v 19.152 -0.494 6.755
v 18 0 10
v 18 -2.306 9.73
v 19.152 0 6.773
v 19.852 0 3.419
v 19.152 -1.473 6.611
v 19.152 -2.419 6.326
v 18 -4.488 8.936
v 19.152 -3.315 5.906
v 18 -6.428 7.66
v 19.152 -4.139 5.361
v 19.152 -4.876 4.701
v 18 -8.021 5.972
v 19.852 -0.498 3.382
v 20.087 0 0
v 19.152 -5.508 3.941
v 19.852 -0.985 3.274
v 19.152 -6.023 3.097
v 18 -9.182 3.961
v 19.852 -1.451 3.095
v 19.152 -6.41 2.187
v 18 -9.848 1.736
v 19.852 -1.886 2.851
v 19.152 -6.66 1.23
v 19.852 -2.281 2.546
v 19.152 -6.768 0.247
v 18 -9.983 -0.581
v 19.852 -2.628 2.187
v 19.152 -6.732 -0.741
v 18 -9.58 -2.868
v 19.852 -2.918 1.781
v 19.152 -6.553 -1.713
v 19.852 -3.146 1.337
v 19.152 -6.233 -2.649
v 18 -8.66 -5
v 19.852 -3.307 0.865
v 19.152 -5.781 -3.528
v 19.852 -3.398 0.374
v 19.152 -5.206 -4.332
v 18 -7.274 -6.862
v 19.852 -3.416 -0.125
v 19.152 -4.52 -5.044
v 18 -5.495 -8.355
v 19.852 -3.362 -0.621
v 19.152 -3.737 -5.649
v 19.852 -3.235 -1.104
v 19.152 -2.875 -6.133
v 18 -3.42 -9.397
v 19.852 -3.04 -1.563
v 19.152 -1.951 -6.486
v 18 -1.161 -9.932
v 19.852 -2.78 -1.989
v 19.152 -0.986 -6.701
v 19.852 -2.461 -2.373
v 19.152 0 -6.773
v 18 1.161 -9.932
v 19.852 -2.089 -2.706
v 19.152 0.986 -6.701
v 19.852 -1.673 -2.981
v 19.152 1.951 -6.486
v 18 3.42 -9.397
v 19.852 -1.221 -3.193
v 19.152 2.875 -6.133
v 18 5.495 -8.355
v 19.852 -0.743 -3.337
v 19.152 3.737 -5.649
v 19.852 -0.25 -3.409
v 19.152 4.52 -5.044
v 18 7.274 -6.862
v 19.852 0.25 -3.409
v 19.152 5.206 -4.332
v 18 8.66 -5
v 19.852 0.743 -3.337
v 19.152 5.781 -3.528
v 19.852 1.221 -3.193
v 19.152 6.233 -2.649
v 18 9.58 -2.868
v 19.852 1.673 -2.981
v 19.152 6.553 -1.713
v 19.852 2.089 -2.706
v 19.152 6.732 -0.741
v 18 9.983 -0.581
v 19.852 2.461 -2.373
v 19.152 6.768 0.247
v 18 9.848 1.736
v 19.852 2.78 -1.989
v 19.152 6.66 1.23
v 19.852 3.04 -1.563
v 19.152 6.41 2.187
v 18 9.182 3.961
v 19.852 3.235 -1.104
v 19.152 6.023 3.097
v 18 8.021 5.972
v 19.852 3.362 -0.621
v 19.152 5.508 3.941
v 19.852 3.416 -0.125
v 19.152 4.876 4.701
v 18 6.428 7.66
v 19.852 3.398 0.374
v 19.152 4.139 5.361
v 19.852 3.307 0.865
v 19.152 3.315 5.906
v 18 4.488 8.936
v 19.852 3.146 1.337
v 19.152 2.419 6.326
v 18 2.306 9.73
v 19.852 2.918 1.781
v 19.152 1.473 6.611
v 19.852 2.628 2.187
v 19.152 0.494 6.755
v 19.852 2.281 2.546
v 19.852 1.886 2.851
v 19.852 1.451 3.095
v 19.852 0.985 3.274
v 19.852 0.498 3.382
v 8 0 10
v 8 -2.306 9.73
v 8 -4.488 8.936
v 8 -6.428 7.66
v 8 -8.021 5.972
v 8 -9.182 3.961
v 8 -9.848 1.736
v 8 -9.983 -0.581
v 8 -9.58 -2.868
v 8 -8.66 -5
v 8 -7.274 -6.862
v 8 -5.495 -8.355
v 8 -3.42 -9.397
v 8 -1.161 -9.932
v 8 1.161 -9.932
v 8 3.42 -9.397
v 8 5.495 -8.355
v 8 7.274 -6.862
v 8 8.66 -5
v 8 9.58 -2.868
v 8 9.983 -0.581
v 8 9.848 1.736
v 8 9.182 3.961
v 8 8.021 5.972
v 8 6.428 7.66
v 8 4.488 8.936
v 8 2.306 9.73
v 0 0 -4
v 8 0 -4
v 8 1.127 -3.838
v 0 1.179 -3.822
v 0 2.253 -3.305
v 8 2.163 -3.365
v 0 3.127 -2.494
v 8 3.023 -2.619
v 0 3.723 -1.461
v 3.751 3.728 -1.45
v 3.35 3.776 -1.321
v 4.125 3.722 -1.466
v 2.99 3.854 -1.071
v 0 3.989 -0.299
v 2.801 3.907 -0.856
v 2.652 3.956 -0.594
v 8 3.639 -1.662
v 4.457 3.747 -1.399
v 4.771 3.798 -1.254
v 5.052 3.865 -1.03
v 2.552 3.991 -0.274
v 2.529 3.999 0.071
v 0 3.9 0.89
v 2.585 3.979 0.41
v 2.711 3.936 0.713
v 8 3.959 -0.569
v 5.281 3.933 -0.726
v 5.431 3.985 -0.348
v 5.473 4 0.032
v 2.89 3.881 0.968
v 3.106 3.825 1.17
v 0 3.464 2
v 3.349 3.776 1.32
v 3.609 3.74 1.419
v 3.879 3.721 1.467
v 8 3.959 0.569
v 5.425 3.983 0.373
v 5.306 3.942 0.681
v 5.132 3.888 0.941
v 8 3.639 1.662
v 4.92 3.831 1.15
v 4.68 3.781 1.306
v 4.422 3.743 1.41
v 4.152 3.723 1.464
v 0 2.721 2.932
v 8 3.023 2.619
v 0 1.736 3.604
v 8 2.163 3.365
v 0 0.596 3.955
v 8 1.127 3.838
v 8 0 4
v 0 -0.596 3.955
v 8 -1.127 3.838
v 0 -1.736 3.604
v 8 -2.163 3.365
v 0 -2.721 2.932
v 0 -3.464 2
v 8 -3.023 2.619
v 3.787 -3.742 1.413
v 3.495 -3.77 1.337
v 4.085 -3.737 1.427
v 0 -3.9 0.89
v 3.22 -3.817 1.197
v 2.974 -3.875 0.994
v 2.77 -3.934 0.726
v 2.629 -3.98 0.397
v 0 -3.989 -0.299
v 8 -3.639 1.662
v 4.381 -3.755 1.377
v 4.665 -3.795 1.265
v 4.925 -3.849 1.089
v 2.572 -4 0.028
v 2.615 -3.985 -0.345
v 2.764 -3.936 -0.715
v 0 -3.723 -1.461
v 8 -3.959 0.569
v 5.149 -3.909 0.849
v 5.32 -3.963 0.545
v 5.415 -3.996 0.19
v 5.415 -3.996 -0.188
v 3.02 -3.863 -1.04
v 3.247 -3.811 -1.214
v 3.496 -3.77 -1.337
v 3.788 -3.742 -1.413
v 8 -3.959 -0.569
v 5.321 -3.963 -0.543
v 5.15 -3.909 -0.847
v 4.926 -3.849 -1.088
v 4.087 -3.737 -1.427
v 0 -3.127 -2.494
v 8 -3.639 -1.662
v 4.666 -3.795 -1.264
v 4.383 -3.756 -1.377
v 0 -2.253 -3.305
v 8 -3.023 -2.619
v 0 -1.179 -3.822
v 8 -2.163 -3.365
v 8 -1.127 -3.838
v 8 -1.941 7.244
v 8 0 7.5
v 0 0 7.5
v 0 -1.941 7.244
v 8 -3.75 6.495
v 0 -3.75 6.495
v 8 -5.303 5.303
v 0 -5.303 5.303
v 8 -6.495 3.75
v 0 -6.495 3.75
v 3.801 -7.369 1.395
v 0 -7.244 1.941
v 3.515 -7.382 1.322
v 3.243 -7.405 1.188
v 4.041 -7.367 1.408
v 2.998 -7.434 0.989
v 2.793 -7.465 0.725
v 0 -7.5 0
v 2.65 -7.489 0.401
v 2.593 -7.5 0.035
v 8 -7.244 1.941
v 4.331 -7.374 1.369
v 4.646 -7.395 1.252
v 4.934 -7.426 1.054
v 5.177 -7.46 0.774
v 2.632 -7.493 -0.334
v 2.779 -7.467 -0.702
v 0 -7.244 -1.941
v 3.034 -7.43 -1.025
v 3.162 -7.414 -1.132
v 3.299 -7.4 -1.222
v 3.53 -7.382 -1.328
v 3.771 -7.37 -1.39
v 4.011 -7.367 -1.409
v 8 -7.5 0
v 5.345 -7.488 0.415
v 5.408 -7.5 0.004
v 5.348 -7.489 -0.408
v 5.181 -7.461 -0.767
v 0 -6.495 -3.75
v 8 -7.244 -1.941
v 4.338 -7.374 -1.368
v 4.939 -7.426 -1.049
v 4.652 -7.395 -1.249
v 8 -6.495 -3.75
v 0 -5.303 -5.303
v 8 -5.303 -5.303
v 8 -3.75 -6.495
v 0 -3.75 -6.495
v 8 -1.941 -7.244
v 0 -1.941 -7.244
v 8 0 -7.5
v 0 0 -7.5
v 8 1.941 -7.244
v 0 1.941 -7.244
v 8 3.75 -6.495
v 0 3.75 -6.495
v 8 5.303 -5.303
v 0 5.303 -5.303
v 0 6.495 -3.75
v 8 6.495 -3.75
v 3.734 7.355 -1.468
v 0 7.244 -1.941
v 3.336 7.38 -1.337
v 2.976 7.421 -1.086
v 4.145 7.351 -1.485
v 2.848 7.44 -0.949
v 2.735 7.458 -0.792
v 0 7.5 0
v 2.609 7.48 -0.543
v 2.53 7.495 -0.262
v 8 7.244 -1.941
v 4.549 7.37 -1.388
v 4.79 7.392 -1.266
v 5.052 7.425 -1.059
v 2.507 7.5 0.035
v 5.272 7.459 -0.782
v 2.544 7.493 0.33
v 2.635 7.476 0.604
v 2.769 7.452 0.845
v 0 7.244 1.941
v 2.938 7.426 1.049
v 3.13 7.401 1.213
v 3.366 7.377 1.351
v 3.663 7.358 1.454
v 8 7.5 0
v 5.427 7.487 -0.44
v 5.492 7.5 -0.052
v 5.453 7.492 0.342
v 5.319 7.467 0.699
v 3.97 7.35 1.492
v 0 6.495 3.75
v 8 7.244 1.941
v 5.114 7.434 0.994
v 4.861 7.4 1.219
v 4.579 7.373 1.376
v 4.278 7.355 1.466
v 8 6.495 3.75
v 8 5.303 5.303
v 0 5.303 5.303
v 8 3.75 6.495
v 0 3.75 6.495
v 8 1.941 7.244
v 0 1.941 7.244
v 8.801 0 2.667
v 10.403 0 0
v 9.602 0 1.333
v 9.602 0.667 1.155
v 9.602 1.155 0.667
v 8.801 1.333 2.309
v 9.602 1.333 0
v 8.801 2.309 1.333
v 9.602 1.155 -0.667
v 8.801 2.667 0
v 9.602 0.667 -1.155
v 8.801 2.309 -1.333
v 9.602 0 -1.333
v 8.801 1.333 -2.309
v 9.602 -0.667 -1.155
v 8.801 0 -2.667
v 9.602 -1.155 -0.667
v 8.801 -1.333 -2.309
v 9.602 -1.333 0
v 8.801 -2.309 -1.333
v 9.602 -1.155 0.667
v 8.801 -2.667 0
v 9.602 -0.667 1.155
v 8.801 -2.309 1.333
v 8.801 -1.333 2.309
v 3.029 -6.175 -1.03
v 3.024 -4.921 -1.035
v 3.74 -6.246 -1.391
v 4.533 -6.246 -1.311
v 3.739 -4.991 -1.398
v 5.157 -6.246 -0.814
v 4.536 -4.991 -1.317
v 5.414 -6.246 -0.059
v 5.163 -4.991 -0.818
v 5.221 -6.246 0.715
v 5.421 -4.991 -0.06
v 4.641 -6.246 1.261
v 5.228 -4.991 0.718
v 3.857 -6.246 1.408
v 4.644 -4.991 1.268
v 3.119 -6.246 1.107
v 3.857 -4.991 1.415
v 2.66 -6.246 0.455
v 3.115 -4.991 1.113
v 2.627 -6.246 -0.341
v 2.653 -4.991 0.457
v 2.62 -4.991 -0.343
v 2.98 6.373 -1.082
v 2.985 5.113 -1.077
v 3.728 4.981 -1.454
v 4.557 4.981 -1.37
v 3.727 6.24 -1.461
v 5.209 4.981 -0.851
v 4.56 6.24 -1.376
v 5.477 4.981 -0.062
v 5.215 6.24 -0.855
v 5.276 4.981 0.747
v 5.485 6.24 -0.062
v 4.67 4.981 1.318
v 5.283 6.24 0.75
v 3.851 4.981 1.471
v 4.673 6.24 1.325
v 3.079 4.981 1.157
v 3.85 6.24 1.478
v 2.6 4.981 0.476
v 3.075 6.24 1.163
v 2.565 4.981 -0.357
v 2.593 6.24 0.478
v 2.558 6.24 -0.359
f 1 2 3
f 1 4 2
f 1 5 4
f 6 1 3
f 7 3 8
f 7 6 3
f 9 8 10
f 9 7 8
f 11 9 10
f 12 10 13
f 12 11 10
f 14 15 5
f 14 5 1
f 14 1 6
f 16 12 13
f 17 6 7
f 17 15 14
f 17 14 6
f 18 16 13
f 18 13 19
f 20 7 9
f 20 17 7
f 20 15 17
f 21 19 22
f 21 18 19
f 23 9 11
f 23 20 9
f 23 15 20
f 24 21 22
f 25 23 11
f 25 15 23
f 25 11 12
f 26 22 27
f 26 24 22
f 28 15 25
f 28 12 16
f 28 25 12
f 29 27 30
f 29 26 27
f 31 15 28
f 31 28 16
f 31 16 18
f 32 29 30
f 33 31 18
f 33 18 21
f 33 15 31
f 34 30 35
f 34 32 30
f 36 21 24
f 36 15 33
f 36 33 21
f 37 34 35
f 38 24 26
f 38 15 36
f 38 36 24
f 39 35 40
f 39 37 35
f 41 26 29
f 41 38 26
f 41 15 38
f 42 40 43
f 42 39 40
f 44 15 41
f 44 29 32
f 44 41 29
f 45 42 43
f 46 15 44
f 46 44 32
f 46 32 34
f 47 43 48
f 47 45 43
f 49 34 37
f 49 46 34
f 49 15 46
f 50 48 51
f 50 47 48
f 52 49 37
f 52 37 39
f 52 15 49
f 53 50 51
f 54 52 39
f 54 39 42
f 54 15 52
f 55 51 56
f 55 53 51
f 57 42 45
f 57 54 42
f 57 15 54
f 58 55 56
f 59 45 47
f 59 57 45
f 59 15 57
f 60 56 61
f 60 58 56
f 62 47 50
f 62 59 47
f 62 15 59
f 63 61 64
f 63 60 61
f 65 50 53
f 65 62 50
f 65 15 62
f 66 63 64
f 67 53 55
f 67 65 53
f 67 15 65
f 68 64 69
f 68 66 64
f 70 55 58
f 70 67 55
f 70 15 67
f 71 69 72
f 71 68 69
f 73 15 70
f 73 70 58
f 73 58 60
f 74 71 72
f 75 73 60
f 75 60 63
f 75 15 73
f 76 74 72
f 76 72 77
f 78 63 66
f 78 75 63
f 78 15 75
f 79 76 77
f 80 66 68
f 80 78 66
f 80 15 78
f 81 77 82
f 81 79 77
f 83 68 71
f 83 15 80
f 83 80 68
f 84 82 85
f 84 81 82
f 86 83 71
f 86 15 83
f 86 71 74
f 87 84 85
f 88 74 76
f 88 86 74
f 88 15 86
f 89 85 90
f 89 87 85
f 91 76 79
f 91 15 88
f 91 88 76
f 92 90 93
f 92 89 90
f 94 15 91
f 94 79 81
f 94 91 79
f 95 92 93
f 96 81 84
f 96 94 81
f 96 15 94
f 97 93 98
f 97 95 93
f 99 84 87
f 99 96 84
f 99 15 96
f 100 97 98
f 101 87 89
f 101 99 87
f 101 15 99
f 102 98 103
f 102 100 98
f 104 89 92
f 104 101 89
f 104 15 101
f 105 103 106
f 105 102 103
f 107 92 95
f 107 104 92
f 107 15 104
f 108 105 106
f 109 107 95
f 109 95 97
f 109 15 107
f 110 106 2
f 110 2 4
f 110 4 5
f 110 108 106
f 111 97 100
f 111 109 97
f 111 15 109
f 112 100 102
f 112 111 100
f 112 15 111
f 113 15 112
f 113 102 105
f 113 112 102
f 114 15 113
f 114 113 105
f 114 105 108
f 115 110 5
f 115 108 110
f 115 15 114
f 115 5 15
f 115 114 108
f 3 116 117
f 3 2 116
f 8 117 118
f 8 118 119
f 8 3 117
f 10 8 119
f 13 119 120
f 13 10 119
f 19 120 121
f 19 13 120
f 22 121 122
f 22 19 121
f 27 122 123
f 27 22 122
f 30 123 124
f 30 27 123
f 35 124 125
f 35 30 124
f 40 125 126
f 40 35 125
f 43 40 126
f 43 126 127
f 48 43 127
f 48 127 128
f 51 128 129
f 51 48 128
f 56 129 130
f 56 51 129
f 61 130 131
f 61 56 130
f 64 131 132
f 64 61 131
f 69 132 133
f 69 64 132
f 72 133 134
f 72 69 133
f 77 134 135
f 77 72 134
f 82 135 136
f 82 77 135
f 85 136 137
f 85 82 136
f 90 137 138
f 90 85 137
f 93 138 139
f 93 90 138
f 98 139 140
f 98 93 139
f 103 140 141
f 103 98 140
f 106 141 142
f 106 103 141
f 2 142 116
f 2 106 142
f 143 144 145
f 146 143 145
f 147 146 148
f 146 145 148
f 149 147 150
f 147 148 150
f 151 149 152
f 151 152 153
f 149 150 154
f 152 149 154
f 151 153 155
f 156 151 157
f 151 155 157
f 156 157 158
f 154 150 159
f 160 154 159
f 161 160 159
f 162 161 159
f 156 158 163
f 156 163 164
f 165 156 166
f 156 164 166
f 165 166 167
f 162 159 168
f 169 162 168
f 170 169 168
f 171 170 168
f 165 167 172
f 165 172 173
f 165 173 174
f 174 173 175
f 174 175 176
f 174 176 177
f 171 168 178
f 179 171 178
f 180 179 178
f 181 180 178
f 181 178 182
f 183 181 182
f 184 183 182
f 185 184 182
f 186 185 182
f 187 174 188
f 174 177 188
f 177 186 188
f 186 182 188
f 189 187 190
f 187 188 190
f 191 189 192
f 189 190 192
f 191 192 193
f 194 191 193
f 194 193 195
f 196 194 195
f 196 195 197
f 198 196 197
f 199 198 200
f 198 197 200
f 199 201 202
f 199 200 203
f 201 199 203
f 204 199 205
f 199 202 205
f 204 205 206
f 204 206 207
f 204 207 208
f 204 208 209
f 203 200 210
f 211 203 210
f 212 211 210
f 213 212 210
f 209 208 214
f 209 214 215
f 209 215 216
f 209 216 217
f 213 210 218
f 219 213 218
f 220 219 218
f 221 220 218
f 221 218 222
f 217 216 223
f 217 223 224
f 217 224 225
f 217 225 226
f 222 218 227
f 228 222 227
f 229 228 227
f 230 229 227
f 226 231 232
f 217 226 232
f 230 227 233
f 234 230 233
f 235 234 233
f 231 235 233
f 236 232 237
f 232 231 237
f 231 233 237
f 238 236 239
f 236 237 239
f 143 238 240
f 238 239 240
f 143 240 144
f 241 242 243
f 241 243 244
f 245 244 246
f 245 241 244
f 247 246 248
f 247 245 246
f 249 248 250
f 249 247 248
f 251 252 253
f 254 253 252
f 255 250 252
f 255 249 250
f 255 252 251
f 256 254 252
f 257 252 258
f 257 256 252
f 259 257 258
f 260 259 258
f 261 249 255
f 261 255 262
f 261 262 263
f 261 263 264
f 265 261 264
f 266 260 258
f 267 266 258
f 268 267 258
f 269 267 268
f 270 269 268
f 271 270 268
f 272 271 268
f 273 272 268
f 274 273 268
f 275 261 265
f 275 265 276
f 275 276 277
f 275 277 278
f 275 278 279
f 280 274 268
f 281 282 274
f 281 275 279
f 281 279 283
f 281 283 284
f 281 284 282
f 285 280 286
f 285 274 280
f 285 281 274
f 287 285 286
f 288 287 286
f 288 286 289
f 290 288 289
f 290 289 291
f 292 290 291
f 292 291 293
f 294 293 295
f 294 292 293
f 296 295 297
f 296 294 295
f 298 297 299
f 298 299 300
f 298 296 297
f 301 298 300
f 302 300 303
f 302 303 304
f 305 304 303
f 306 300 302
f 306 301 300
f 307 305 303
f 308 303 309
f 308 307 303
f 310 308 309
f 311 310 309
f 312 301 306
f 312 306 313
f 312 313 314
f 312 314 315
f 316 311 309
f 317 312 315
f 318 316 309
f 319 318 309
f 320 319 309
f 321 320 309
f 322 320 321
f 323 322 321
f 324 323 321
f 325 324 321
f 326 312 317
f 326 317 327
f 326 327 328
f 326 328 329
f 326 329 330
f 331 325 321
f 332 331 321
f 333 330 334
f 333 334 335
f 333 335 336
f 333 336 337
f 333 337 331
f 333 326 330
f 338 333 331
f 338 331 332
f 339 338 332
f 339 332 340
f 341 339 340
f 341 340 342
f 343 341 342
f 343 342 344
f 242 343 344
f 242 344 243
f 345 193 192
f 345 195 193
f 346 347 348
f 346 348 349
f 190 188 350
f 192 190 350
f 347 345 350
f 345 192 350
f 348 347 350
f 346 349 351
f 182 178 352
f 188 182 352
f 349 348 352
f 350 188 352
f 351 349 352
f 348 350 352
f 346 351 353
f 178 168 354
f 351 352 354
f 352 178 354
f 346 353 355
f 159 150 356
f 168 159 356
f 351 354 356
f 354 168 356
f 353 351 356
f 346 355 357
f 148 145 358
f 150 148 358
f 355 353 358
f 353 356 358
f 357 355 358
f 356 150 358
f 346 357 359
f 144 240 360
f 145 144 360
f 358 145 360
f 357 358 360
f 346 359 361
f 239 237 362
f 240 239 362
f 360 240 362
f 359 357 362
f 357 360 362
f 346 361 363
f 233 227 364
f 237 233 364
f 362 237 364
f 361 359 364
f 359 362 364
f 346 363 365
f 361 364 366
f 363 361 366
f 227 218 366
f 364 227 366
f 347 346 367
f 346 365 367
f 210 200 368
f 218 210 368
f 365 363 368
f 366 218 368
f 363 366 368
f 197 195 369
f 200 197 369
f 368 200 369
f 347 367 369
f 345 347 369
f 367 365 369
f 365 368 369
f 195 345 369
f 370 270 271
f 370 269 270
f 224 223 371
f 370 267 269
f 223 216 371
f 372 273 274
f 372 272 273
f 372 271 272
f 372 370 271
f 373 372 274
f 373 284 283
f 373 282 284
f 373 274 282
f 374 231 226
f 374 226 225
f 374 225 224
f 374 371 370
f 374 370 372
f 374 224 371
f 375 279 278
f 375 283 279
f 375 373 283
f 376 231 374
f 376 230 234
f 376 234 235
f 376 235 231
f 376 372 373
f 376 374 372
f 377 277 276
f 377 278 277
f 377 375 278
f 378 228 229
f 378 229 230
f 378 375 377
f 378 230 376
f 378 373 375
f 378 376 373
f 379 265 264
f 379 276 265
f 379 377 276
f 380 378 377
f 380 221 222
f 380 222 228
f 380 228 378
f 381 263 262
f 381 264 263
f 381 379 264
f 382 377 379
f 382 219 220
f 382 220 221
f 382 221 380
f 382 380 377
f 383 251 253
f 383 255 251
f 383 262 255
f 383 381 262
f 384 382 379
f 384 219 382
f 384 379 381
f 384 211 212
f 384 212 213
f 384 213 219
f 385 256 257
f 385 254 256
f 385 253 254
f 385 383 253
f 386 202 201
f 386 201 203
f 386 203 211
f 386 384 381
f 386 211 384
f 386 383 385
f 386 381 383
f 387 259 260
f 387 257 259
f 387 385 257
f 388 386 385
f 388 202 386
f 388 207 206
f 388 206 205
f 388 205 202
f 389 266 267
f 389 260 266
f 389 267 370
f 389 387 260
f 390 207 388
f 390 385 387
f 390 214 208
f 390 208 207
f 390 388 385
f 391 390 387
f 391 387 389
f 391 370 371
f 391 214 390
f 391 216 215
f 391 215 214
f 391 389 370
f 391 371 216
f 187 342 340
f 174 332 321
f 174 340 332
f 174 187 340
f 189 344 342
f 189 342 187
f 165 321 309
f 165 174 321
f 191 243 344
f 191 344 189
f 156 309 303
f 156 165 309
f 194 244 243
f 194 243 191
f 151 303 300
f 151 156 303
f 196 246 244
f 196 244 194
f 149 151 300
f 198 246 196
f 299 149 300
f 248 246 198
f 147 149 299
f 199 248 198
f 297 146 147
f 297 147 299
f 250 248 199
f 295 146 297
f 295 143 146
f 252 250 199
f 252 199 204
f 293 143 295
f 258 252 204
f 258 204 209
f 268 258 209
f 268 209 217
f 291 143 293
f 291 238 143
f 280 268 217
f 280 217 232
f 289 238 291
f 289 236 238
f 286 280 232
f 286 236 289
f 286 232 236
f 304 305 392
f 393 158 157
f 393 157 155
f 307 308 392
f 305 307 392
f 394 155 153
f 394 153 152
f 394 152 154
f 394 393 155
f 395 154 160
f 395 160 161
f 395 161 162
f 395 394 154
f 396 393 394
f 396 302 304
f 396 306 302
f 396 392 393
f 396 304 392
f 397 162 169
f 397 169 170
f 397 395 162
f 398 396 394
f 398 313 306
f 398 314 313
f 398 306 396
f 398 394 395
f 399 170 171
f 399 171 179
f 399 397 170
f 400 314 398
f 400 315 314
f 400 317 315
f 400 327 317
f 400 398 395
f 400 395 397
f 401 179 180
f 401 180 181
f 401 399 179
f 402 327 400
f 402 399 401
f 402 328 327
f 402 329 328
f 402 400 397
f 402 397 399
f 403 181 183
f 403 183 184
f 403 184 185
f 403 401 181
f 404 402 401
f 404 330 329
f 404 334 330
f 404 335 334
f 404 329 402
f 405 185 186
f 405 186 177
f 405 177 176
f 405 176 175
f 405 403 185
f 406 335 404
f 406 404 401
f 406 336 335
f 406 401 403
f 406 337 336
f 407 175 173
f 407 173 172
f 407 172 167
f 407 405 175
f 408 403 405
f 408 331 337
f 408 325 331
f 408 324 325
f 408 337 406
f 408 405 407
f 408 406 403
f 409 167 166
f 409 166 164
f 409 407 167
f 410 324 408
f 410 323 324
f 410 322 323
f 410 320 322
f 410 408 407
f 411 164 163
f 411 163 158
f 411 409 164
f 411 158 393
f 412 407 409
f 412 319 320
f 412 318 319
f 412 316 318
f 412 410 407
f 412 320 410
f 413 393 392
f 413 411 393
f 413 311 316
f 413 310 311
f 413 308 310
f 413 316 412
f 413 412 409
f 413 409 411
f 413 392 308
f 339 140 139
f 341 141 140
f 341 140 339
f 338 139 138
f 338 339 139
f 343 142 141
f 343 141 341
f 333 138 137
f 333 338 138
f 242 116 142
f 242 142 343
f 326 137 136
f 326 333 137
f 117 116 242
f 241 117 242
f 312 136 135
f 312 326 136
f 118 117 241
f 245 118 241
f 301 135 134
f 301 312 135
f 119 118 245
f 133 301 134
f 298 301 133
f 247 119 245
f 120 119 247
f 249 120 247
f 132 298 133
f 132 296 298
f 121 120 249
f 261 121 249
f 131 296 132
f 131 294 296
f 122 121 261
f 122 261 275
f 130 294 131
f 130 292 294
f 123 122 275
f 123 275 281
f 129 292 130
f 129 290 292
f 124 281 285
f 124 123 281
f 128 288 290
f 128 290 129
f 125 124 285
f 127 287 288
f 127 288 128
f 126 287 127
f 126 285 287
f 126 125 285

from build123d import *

# Parameters (mm, degrees)
F_8_0MM_1_D     = 8
F_8_0MM_1_DEPTH = 8
F_8_0MM_1_TIP   = 2.403442476


with BuildPart() as part:
    # 草图1 → 旋转1 (revolve)
    with BuildSketch(Plane.XY, mode=Mode.PRIVATE) as revolve_1_sk:
        with BuildLine():
            Line((0, 0), (0, 7.5))
            Line((0, 7.5), (8, 7.5))
            Line((8, 7.5), (8, 10))
            Line((8, 10), (18, 10))
            ThreePointArc((18, 10), (19.559779348, 5.107741092), (20.087121525, 0))
            Line((20.087121525, 0), (0, 0))
        make_face()
    revolve(revolve_1_sk.sketch.rotate(Axis((0, 0, 0), (1, 0, 0)), 90), axis=Axis((0, 0, 0), (1, 0, 0)))

    # Ø8.0mm 暗销孔1
    with Locations(Plane.ZY):
        with Locations((0, 0)):
            Hole(F_8_0MM_1_D / 2, depth=F_8_0MM_1_DEPTH)
            with Locations((0, 0, -(F_8_0MM_1_DEPTH + F_8_0MM_1_TIP / 2))):  # 118° drill point
                Cone(0, F_8_0MM_1_D / 2, F_8_0MM_1_TIP, mode=Mode.SUBTRACT)

    # 草图4 → 切除-旋转1 (revolve, cut)
    with BuildSketch(Plane.XY, mode=Mode.PRIVATE) as cut_revolve_1_sk:
        Polygon((4, -8.895136949), (5.4, -8.895136949), (5.5, 8.719380104), (4, 8.719380104), align=None)
    revolve(cut_revolve_1_sk.sketch.rotate(Axis((4, 18.564015212, 0), (0, -1, 0)), 226.690648884), axis=Axis((4, 18.564015212, 0), (0, -1, 0)), mode=Mode.SUBTRACT)


solid = part.part
